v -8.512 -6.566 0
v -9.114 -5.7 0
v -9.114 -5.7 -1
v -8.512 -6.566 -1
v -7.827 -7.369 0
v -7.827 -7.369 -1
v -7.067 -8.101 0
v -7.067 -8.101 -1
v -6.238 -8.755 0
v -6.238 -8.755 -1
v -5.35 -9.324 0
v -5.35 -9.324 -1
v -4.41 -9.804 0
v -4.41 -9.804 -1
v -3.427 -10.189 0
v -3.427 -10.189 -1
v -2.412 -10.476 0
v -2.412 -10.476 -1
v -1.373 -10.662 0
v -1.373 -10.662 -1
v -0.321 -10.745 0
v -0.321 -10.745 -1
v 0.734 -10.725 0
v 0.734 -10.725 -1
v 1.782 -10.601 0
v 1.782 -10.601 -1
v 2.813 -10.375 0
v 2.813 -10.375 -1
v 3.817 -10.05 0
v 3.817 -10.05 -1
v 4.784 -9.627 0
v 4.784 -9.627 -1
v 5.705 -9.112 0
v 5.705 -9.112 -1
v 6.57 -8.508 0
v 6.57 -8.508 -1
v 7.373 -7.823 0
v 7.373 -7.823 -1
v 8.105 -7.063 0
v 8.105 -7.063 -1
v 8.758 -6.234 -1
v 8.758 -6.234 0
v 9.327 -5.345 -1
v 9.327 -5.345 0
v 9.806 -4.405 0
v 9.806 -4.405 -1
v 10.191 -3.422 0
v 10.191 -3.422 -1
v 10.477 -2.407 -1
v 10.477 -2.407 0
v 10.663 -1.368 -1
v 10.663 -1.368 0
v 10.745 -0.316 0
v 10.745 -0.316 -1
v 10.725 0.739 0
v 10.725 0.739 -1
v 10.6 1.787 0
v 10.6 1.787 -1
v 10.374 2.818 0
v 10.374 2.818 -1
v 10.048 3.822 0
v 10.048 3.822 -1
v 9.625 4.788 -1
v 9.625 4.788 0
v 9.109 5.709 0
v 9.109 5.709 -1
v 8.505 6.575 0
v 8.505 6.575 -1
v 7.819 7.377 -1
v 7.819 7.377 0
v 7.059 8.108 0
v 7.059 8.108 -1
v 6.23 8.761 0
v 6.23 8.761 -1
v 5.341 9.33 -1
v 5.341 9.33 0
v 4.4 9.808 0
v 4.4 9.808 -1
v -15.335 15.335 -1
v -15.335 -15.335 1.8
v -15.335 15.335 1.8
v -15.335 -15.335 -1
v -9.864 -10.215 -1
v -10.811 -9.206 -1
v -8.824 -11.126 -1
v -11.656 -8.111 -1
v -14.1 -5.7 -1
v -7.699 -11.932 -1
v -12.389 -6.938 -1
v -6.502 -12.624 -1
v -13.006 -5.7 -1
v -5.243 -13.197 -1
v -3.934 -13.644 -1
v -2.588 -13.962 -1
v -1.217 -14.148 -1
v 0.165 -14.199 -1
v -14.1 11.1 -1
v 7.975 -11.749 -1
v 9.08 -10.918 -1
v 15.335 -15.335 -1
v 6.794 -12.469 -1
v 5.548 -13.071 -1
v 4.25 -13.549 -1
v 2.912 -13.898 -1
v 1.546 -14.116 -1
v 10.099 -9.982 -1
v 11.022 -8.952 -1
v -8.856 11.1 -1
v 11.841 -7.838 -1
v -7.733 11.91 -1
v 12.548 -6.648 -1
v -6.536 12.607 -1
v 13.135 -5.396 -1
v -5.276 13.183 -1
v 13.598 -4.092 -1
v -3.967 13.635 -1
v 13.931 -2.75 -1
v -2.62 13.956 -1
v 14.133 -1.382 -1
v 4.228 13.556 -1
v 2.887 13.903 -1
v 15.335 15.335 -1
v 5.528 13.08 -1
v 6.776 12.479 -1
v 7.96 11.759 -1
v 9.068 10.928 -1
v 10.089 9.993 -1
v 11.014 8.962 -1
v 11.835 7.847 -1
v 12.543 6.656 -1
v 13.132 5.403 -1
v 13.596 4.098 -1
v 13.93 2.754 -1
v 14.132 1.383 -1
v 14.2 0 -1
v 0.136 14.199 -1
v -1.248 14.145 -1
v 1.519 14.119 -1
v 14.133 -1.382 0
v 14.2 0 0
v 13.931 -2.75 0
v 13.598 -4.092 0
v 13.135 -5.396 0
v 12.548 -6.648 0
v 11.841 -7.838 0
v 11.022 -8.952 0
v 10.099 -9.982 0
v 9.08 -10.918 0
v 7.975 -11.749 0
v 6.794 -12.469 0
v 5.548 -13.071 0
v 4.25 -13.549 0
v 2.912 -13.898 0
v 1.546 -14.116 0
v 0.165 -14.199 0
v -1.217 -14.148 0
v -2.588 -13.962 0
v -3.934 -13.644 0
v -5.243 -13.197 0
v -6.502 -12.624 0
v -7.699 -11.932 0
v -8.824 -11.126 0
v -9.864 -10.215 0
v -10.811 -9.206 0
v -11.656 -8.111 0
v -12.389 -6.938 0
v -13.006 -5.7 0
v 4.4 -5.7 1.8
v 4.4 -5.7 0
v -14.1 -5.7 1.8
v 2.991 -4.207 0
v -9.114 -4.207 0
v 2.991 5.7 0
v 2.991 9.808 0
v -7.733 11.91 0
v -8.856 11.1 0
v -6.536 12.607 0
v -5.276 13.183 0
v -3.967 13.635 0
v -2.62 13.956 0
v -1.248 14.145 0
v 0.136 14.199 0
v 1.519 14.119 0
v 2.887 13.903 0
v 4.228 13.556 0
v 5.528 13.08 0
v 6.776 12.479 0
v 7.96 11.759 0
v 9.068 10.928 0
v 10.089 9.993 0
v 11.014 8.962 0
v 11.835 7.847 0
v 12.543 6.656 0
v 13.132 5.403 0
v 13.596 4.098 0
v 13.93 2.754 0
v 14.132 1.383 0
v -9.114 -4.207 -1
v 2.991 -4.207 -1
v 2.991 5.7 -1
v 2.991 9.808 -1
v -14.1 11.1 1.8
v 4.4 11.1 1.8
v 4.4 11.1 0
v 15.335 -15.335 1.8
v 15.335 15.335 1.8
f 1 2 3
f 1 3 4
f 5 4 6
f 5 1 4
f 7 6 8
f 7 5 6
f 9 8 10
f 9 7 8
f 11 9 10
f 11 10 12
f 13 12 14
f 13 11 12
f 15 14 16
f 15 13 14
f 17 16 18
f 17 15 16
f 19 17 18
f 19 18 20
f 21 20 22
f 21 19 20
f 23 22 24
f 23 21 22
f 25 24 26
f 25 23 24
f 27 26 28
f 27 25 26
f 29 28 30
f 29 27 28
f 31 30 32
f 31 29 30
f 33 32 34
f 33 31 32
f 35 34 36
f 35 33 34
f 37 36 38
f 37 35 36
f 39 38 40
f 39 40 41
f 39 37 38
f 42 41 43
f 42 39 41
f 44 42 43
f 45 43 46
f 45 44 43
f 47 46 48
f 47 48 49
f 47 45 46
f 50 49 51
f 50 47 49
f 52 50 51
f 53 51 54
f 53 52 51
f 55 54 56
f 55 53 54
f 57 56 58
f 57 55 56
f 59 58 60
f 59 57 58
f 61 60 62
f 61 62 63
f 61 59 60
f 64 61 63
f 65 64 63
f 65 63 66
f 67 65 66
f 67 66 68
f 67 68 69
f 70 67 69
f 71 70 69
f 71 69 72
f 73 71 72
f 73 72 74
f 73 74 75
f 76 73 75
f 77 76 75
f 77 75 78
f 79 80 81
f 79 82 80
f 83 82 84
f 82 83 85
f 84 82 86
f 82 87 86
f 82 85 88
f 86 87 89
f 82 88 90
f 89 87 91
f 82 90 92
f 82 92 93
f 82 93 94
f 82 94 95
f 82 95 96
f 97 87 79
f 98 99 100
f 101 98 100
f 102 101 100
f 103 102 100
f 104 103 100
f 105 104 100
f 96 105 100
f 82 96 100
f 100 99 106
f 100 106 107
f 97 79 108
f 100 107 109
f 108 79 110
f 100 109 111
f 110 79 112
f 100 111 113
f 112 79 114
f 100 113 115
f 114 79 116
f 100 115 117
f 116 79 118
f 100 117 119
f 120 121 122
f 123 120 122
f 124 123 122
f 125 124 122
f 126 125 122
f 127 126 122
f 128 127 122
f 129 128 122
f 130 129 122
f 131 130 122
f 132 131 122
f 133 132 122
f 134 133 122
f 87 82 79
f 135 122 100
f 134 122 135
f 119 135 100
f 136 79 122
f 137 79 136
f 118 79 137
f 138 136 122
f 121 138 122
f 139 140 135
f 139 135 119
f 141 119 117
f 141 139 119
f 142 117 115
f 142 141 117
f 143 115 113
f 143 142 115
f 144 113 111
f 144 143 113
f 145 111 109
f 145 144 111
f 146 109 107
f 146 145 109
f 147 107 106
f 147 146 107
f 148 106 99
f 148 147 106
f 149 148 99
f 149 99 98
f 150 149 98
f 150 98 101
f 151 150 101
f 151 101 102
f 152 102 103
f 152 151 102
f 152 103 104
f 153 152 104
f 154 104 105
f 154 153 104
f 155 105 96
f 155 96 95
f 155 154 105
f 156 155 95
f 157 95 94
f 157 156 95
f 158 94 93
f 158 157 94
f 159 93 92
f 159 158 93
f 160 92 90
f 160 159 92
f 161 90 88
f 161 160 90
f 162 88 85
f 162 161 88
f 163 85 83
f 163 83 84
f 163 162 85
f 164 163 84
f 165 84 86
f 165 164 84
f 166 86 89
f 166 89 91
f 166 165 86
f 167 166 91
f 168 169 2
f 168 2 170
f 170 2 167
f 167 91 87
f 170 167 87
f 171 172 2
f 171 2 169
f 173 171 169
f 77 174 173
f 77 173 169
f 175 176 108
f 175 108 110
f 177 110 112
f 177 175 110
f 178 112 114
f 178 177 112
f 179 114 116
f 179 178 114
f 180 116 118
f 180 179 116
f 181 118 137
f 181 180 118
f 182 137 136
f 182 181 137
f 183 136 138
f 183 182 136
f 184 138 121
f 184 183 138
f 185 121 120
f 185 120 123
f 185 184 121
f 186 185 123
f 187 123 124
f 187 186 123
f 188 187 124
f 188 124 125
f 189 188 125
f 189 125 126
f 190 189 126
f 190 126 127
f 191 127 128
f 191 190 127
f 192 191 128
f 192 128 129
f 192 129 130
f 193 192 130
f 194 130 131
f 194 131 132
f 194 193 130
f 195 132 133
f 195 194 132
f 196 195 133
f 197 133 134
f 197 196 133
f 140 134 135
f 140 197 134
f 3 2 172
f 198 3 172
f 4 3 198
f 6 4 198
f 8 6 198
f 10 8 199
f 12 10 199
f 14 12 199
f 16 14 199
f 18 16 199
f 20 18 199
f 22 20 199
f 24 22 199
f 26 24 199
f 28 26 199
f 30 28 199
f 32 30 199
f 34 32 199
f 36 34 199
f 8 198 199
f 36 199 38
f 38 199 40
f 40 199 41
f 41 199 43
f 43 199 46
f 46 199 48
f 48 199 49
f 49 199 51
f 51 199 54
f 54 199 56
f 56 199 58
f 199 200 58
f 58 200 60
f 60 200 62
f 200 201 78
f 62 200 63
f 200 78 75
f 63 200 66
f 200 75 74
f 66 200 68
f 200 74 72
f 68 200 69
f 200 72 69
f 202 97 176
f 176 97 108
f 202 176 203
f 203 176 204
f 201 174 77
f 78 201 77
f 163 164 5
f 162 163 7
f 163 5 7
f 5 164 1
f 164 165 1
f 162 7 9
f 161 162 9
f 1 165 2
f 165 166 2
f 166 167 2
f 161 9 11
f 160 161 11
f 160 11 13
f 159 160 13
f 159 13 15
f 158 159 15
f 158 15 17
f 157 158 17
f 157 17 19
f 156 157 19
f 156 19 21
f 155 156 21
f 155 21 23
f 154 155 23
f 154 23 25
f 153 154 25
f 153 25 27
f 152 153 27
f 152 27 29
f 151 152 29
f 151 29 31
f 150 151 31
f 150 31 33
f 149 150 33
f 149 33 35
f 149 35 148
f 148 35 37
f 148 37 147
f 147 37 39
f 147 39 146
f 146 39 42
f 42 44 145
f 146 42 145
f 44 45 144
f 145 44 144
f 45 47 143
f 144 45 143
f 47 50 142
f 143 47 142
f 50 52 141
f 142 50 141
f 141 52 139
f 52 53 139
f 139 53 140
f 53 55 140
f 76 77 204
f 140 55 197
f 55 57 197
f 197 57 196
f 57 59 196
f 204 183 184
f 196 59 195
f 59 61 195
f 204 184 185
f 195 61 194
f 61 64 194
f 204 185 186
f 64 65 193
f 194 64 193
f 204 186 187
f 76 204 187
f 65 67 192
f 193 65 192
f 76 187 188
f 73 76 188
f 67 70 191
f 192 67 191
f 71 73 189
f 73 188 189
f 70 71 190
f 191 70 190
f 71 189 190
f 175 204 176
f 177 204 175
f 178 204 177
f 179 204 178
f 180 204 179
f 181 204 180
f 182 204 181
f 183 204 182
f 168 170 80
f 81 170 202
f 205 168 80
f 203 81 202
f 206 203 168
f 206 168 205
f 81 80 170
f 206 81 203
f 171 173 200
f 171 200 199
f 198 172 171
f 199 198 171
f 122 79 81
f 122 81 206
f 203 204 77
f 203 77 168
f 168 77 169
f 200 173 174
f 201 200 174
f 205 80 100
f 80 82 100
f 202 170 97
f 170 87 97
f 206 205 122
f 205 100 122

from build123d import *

# Parameters (mm, degrees)
F0_W     = 30.67
F0_H     = 30.67
F1_DEPTH = 1
F0_W_2   = 12.1056904889
F0_H_2   = 1.4927708568
F0_W_3   = 1.4087211761
F0_H_3   = 4.1082873123
F2_DEPTH = 1.8


# Not quite as in the source:
# - a feature names something its author has since deleted; it is built from what else it names


with BuildPart() as f1:
    # F0 (on Top) → F1 (new body)
    with BuildSketch(Plane.XY):
        Rectangle(F0_W, F0_H)
        with BuildLine():
            ThreePointArc((-8.8560749891, 11.0999971075), (6.1596970362, 12.7944570976), (14.2, 0))
            ThreePointArc((14.2, 0), (2.9118804142, -13.8982355878), (-13.0057679512, -5.7))
            Line((-13.0057679512, -5.7), (-14.0999610525, -5.7))
            Line((-14.0999610525, -5.7), (-14.0999610525, -1.6825867938))
            ThreePointArc((-14.0999610525, -1.6825867938), (-14.2, 0), (-14.0999610525, 1.6825867938))
            Line((-14.0999610525, 1.6825867938), (-14.0999610525, 5.7))
            Line((-14.0999610525, 5.7), (-14.0999610525, 11.0999971075))
            Line((-14.0999610525, 11.0999971075), (-8.8560749891, 11.0999971075))
        make_face(mode=Mode.SUBTRACT)
        with BuildLine():
            ThreePointArc((-14.0999610525, 1.6825867938), (-14.2, 0), (-14.0999610525, -1.6825867938))
            Line((-14.0999610525, -1.6825867938), (-14.0999610525, 1.6825867938))
        make_face()
    extrude(amount=-F1_DEPTH)



with BuildPart() as f1b:
    # F0 (on Top) → F1, piece 2 (new body)
    with BuildSketch(Plane.XY):
        with BuildLine():
            Line((2.9913177714, -5.7), (-9.1143727175, -5.7))
            ThreePointArc((-9.1143727175, -5.7), (-3.1266086976, -10.2852600601), (4.4000389475, -9.8082873123))
            ThreePointArc((4.4000389475, -9.8082873123), (10.7500389475, 0), (4.4000389475, 9.8082873123))
            Line((4.4000389475, 9.8082873123), (4.4000389475, 5.7))
            Line((4.4000389475, 5.7), (4.4000389475, 4.2072320357))
            Line((4.4000389475, 4.2072320357), (4.4000389475, -4.2072320357))
            Line((4.4000389475, -4.2072320357), (4.4000389475, -5.7))
            Line((4.4000389475, -5.7), (2.9913177714, -5.7))
        make_face()
        Polygon((2.9913177714, -4.2072291432), (2.9913177714, -5.7), (4.4000389475, -5.7), (4.4000389475, -4.2072320357), (4.4000389475, 4.2072320357), (4.4000389475, 5.7), (2.9913177714, 5.7), (2.9913177714, 4.2072291432), align=None)
        with Locations((-3.0615274731, -4.9536145716)):
            Rectangle(F0_W_2, F0_H_2)
        Polygon((2.9913177714, -4.2072291432), (2.9913177714, -5.7), (4.4000389475, -5.7), (4.4000389475, -4.2072320357), (4.4000389475, 4.2072320357), (4.4000389475, 5.7), (2.9913177714, 5.7), (2.9913177714, 4.2072291432), align=None)
        with Locations((3.6956783594, 7.7541436561)):
            Rectangle(F0_W_3, F0_H_3)
    extrude(amount=-F1_DEPTH)


with BuildPart() as f1_1:
    add(f1.part)

    add(f1b.part)  # F2 merges F1b
    # F0 (on Top) → F2 (join)
    with BuildSketch(Plane.XY):
        Rectangle(F0_W, F0_H)
        with BuildLine():
            ThreePointArc((-8.8560749891, 11.0999971075), (6.1596970362, 12.7944570976), (14.2, 0))
            ThreePointArc((14.2, 0), (2.9118804142, -13.8982355878), (-13.0057679512, -5.7))
            Line((-13.0057679512, -5.7), (-14.0999610525, -5.7))
            Line((-14.0999610525, -5.7), (-14.0999610525, -1.6825867938))
            ThreePointArc((-14.0999610525, -1.6825867938), (-14.2, 0), (-14.0999610525, 1.6825867938))
            Line((-14.0999610525, 1.6825867938), (-14.0999610525, 5.7))
            Line((-14.0999610525, 5.7), (-14.0999610525, 11.0999971075))
            Line((-14.0999610525, 11.0999971075), (-8.8560749891, 11.0999971075))
        make_face(mode=Mode.SUBTRACT)
        with BuildLine():
            ThreePointArc((-13.0057679512, -5.7), (2.9118804142, -13.8982355878), (14.2, 0))
            ThreePointArc((14.2, 0), (6.1596970362, 12.7944570976), (-8.8560749891, 11.0999971075))
            Line((-8.8560749891, 11.0999971075), (2.9913177714, 11.0999971075))
            Line((2.9913177714, 11.0999971075), (4.4000389475, 11.0999971075))
            Line((4.4000389475, 11.0999971075), (4.4000389475, 9.8082873123))
            ThreePointArc((4.4000389475, 9.8082873123), (10.7500389475, 0), (4.4000389475, -9.8082873123))
            ThreePointArc((4.4000389475, -9.8082873123), (-3.1266086976, -10.2852600601), (-9.1143727175, -5.7))
            Line((-9.1143727175, -5.7), (-13.0057679512, -5.7))
        make_face()
        with BuildLine():
            Line((2.9913177714, -5.7), (-9.1143727175, -5.7))
            ThreePointArc((-9.1143727175, -5.7), (-3.1266086976, -10.2852600601), (4.4000389475, -9.8082873123))
            ThreePointArc((4.4000389475, -9.8082873123), (10.7500389475, 0), (4.4000389475, 9.8082873123))
            Line((4.4000389475, 9.8082873123), (4.4000389475, 5.7))
            Line((4.4000389475, 5.7), (4.4000389475, 4.2072320357))
            Line((4.4000389475, 4.2072320357), (4.4000389475, -4.2072320357))
            Line((4.4000389475, -4.2072320357), (4.4000389475, -5.7))
            Line((4.4000389475, -5.7), (2.9913177714, -5.7))
        make_face()
        with BuildLine():
            ThreePointArc((-14.0999610525, 1.6825867938), (-14.2, 0), (-14.0999610525, -1.6825867938))
            Line((-14.0999610525, -1.6825867938), (-14.0999610525, 1.6825867938))
        make_face()
    extrude(amount=F2_DEPTH)


solid = f1_1.part
